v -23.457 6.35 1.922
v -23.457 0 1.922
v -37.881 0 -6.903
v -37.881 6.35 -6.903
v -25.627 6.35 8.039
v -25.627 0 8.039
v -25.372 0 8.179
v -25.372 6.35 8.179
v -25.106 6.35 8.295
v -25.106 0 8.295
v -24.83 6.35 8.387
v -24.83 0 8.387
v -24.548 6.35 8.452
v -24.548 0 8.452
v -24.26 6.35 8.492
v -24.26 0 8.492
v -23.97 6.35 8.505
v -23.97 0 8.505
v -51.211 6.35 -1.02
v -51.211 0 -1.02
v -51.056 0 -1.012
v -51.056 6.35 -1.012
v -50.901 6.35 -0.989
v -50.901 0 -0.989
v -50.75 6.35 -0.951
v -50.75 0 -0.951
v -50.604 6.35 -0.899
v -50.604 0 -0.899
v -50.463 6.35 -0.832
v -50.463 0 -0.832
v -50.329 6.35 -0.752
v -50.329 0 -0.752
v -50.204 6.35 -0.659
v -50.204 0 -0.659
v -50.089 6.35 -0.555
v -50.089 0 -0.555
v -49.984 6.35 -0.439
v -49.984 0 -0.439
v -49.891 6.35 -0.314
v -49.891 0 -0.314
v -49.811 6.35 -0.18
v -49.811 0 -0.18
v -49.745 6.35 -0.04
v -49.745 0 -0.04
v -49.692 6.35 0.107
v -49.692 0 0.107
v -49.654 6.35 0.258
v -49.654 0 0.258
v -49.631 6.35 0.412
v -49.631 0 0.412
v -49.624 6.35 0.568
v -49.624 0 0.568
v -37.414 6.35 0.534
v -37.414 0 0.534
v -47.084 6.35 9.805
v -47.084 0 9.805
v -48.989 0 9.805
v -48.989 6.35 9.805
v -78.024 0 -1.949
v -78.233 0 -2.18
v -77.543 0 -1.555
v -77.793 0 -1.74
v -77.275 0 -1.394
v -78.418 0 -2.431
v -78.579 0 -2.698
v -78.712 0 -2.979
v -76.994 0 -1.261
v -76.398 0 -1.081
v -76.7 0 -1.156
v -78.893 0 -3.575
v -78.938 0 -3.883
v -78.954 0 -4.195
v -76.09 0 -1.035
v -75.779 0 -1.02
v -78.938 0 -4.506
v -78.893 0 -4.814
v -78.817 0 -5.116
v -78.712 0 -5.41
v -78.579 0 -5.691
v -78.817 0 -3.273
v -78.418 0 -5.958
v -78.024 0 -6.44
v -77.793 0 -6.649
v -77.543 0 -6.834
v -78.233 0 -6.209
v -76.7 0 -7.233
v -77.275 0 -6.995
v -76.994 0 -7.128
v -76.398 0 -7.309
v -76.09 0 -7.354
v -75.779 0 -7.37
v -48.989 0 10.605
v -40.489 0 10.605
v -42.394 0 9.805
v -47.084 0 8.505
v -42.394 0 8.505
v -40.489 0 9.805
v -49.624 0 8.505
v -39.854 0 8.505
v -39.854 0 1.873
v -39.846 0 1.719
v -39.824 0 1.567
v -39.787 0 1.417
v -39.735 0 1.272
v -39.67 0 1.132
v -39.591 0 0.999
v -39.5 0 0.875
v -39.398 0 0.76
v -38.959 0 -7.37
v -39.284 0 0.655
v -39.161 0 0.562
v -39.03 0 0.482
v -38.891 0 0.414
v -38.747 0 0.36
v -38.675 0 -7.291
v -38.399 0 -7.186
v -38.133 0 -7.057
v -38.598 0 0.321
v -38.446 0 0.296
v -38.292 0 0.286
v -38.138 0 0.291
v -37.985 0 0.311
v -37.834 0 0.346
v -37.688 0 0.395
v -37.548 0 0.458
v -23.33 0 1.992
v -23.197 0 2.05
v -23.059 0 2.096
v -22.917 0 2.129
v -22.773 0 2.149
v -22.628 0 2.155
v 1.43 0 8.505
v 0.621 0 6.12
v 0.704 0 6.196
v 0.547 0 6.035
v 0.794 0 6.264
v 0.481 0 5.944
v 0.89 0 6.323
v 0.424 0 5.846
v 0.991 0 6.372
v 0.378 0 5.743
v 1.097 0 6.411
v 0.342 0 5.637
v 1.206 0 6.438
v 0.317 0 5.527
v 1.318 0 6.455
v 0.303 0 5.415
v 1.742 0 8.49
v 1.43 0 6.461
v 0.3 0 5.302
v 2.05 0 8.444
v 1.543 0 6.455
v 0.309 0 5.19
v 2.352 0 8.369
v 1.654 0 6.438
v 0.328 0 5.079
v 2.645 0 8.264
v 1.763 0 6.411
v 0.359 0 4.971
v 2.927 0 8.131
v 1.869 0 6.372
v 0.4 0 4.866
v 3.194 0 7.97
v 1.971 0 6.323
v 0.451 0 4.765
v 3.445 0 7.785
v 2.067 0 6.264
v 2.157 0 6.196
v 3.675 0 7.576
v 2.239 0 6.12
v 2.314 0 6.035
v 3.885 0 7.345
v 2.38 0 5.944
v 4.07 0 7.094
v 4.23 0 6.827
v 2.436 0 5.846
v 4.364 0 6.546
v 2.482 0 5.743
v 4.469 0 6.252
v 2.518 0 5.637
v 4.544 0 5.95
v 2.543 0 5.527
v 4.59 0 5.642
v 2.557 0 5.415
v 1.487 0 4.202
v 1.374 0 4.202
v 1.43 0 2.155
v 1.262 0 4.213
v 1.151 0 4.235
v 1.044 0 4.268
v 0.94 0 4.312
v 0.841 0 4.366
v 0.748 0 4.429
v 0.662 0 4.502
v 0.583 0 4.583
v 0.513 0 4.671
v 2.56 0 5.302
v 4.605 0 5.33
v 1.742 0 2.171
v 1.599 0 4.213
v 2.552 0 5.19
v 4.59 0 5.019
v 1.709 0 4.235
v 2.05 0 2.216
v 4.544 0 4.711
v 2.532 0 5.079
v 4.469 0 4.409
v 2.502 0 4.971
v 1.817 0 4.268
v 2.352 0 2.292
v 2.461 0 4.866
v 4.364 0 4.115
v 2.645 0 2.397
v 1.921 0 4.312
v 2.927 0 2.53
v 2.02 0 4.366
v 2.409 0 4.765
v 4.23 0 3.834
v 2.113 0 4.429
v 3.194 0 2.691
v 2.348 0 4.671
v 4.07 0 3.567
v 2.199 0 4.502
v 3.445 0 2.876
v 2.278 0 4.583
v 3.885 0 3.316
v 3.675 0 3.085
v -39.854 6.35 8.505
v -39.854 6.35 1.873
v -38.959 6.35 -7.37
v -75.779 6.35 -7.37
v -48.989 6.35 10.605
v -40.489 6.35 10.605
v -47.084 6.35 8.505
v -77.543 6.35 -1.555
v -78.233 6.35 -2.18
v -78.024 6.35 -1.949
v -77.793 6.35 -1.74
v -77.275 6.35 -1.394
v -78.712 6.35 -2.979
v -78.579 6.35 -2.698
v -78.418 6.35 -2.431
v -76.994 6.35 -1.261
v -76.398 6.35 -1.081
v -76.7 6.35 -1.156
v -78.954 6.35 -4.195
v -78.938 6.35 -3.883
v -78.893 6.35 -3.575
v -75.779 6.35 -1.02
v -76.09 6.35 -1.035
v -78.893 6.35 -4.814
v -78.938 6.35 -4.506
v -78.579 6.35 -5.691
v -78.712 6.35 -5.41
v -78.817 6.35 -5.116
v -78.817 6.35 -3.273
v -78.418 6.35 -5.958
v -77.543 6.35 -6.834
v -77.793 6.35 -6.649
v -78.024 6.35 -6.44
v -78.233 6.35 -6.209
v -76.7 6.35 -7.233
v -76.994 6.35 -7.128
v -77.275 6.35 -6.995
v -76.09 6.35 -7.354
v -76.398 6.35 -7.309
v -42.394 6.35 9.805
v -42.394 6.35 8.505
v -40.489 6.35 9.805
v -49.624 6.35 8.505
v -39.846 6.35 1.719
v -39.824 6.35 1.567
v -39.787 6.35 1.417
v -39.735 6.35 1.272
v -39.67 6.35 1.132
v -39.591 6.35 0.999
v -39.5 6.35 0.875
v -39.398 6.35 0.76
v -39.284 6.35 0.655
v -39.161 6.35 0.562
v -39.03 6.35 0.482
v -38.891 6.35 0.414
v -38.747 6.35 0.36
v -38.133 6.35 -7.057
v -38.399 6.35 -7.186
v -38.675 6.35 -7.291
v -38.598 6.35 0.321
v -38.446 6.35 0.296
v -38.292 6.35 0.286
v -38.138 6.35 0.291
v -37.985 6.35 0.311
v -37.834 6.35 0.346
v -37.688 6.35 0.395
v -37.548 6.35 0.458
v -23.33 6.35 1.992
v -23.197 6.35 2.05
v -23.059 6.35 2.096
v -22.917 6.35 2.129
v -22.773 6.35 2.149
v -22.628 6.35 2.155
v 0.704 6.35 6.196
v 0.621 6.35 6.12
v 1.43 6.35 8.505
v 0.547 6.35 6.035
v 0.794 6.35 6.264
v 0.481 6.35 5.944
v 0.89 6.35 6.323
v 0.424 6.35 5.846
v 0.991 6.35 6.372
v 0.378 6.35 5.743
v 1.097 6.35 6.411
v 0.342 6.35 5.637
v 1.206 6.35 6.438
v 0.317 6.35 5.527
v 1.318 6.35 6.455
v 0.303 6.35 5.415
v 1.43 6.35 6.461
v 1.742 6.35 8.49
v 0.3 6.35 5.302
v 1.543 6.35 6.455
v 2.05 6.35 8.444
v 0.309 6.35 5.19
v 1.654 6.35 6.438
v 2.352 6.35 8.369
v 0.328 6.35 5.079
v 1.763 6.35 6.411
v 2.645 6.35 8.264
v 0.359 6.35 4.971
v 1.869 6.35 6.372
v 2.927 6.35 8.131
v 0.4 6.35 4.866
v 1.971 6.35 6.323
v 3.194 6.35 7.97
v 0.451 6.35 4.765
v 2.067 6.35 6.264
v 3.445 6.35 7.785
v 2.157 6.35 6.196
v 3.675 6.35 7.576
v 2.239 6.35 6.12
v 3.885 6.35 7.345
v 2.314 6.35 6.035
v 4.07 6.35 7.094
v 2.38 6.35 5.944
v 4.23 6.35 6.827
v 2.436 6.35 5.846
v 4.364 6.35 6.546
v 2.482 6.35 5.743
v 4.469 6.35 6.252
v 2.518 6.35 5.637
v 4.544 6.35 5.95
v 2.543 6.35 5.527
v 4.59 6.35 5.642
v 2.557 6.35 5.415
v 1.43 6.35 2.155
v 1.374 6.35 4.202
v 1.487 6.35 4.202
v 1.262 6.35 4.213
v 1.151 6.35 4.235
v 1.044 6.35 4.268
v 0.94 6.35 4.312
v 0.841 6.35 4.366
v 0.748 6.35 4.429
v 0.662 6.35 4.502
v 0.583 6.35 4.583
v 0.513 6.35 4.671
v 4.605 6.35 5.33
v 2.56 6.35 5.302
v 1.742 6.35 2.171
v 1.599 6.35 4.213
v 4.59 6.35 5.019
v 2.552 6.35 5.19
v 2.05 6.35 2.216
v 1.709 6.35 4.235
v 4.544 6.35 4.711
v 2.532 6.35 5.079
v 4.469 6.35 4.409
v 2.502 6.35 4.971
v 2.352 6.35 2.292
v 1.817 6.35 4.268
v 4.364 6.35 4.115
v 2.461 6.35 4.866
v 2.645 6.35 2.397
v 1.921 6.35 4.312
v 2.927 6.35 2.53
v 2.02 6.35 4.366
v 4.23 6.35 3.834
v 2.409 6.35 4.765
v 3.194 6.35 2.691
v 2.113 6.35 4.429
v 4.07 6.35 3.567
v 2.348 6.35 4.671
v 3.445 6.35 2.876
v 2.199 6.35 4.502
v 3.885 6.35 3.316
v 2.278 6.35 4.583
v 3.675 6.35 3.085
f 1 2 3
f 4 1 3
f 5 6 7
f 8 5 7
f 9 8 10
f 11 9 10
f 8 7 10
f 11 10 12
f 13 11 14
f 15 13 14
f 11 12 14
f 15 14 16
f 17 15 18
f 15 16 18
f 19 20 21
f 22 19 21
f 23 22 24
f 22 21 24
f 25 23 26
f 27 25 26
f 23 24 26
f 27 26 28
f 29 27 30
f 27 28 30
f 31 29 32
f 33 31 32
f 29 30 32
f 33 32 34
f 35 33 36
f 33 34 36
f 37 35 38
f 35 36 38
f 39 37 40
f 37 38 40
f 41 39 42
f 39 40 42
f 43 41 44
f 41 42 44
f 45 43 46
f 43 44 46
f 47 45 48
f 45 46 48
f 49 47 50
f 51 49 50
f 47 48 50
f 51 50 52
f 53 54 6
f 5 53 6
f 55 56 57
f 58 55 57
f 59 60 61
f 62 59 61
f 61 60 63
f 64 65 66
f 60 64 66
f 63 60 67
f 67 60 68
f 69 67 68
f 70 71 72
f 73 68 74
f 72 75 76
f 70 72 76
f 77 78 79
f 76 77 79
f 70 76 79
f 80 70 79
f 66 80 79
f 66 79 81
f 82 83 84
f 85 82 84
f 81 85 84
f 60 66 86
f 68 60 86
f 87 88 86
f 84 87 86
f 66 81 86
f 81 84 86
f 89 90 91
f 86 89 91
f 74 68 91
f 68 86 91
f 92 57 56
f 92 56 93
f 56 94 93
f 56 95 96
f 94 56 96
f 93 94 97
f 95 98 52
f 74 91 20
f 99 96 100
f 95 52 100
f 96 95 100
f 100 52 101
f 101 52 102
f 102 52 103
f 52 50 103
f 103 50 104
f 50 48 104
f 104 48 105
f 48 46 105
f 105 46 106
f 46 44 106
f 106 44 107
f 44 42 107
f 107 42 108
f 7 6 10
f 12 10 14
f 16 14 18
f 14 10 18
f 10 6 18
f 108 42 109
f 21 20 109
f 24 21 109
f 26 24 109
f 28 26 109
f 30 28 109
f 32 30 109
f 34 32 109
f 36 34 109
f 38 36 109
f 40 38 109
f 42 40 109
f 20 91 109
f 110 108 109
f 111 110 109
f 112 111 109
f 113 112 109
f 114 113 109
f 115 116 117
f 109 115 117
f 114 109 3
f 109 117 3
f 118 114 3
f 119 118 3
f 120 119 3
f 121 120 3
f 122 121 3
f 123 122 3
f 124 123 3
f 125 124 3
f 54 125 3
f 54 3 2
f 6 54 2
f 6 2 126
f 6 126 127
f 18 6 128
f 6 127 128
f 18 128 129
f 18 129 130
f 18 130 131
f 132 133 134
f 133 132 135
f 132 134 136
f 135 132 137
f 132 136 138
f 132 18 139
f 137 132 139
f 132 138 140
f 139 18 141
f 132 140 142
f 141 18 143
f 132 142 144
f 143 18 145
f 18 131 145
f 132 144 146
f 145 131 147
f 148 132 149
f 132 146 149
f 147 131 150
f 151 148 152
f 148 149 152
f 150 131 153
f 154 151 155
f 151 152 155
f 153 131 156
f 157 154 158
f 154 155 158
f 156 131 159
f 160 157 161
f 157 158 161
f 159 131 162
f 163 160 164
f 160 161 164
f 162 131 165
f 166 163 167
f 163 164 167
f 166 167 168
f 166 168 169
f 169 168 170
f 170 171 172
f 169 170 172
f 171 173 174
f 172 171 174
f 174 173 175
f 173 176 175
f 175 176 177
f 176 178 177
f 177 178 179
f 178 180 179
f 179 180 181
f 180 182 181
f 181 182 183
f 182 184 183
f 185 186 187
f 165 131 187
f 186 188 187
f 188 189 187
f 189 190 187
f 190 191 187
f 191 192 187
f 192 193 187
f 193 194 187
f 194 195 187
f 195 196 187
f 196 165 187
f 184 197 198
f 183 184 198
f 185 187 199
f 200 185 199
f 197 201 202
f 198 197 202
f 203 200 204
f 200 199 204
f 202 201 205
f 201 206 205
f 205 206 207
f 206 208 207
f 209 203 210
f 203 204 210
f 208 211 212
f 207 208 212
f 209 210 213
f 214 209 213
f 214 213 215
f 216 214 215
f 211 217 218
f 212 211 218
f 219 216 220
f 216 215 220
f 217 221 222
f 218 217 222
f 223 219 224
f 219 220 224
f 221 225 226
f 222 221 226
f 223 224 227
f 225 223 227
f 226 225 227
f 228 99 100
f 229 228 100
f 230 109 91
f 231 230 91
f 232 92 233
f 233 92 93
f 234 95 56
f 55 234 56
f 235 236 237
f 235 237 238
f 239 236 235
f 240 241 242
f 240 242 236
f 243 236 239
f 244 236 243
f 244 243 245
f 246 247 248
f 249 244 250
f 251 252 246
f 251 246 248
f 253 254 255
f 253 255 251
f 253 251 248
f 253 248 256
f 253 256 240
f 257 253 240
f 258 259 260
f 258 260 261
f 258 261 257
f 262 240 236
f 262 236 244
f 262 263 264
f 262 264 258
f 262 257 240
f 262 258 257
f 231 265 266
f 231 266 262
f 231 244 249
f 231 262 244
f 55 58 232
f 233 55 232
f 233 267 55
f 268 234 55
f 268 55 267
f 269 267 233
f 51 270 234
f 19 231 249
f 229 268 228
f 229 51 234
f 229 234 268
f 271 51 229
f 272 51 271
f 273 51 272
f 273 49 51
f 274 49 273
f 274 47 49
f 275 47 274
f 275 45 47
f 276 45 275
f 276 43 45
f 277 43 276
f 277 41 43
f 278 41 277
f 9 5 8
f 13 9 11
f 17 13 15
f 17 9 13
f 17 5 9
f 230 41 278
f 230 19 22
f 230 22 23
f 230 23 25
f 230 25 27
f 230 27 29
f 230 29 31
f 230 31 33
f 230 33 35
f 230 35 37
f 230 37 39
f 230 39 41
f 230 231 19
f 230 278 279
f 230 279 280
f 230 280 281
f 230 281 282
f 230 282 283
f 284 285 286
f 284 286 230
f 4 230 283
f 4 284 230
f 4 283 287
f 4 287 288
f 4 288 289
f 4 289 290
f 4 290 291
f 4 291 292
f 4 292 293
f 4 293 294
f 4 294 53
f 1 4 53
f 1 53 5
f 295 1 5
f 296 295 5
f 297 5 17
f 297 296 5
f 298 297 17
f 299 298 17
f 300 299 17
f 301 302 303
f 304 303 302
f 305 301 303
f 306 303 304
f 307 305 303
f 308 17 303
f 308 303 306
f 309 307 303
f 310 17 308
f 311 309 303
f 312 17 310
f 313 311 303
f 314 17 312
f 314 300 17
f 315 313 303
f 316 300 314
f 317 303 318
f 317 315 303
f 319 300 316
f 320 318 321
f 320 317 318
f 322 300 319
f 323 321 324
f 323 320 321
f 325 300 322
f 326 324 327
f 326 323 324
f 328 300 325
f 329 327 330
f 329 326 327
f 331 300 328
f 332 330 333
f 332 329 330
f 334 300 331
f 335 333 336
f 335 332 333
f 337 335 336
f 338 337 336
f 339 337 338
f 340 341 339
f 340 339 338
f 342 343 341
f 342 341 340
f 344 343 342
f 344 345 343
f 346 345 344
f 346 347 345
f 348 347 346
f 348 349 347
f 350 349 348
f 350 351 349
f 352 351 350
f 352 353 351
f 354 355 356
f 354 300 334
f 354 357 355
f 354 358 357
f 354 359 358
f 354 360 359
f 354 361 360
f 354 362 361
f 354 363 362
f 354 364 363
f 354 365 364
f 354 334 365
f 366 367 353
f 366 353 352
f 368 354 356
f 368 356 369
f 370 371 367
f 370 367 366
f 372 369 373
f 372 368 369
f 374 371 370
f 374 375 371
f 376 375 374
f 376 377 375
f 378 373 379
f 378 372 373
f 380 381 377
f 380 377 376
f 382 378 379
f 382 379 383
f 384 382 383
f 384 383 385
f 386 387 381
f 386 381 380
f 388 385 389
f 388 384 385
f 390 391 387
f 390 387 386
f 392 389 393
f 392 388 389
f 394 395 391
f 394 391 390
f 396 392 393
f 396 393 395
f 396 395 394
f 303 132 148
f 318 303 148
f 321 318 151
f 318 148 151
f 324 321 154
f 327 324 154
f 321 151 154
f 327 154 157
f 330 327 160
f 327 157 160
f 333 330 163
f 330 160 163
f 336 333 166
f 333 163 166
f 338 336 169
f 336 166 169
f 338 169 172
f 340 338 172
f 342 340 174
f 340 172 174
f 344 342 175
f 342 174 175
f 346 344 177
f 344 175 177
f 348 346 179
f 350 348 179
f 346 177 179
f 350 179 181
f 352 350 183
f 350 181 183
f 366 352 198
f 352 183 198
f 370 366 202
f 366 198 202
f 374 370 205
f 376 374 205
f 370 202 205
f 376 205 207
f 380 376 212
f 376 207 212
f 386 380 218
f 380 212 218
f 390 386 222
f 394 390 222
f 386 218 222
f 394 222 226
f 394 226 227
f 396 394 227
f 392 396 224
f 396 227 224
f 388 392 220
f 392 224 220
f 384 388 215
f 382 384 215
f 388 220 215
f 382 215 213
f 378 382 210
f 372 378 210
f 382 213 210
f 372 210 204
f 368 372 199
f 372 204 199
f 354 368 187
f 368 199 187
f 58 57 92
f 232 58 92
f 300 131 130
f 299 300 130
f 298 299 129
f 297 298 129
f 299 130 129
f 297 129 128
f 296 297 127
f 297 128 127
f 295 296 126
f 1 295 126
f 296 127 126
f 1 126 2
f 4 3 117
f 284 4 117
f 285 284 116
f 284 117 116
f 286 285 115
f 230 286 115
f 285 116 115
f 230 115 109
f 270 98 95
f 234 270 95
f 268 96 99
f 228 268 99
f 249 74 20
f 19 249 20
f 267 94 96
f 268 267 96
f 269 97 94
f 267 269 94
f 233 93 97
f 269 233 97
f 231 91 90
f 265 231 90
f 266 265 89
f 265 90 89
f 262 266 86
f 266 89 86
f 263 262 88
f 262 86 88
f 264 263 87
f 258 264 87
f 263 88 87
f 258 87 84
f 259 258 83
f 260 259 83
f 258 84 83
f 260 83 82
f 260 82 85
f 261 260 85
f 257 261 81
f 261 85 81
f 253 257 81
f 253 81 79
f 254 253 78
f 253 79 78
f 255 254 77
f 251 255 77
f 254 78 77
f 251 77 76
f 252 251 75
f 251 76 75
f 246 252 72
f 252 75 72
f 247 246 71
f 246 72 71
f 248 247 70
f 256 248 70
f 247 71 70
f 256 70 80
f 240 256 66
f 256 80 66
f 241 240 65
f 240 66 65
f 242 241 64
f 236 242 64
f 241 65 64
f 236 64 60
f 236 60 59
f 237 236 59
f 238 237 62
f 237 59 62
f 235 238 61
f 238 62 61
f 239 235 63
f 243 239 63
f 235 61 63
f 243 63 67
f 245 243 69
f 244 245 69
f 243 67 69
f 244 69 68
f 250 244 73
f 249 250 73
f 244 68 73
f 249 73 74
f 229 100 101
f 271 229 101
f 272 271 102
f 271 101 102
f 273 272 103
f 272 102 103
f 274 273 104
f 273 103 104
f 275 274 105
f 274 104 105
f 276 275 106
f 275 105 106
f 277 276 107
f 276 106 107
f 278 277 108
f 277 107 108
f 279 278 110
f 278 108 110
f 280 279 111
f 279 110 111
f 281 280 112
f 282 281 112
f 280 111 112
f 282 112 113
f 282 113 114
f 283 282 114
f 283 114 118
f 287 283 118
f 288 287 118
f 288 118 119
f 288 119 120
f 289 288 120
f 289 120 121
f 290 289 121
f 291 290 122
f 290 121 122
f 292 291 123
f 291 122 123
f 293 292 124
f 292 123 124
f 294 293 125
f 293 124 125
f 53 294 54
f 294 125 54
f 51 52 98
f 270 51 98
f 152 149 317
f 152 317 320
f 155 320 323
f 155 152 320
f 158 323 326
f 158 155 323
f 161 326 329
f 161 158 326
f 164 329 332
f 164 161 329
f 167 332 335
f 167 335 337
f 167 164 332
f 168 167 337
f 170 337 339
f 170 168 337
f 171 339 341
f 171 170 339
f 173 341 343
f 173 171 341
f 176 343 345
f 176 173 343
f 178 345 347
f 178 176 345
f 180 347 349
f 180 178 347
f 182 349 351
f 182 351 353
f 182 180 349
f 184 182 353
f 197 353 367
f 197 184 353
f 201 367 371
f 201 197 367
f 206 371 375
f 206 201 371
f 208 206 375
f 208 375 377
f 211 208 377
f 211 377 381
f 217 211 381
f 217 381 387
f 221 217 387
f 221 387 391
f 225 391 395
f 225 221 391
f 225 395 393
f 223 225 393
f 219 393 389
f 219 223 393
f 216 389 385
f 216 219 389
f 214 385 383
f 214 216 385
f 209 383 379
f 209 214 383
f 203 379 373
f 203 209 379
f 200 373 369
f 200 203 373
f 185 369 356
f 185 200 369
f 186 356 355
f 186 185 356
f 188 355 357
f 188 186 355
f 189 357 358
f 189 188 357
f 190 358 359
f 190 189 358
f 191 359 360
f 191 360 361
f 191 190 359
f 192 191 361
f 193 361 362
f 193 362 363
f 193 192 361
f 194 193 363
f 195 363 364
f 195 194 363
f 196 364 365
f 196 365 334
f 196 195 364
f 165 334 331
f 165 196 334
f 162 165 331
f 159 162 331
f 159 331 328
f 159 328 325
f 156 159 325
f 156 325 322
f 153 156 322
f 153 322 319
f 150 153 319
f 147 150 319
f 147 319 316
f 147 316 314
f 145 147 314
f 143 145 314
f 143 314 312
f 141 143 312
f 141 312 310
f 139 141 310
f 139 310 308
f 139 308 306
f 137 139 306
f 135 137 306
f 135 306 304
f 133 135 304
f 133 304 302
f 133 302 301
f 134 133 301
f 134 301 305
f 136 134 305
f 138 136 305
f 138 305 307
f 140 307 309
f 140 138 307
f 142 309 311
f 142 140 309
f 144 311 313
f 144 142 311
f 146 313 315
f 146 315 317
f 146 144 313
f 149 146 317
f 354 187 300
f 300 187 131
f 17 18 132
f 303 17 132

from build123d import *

# Parameters (mm, degrees)
SKETCH1_R           = 1.1303
BOSS_EXTRUDE1_DEPTH = 6.35


with BuildPart() as part:
    # Sketch1 → Boss-Extrude1 (new body)
    with BuildSketch(Plane(origin=(0, 0, 0), x_dir=(1, 0, 0), z_dir=(0, 1, 0))):
        with BuildLine():
            Line((1.430315472, -2.155489974), (-22.62836127, -2.155489974))
            ThreePointArc((-22.62836127, -2.155489974), (-23.058725894, -2.096041852), (-23.456858243, -1.922149868))
            Line((-23.456858243, -1.922149868), (-37.881091448, 6.902829812))
            ThreePointArc((-37.881091448, 6.902829812), (-38.398503134, 7.18649116), (-38.959469005, 7.369510026))
            Line((-38.959469005, 7.369510026), (-75.77856814, 7.369510026))
            ThreePointArc((-75.77856814, 7.369510026), (-78.95356814, 4.194510026), (-75.77856814, 1.019510026))
            Line((-75.77856814, 1.019510026), (-51.211184528, 1.019510026))
            ThreePointArc((-51.211184528, 1.019510026), (-50.088652513, 0.554542041), (-49.623684528, -0.567989974))
            Line((-49.623684528, -0.567989974), (-49.623684528, -8.505489974))
            Line((-49.623684528, -8.505489974), (-47.083684528, -8.505489974))
            Line((-47.083684528, -8.505489974), (-47.083684528, -9.805489974))
            Line((-47.083684528, -9.805489974), (-48.988684528, -9.805489974))
            Line((-48.988684528, -9.805489974), (-48.988684528, -10.605489974))
            Line((-48.988684528, -10.605489974), (-40.48868451, -10.605489974))
            Line((-40.48868451, -10.605489974), (-40.48868451, -9.805489974))
            Line((-40.48868451, -9.805489974), (-42.39368451, -9.805489974))
            Line((-42.39368451, -9.805489974), (-42.39368451, -8.505489974))
            Line((-42.39368451, -8.505489974), (-39.85368451, -8.505489974))
            Line((-39.85368451, -8.505489974), (-39.85368451, -1.873214268))
            ThreePointArc((-39.85368451, -1.873214268), (-39.029938005, -0.481511409), (-37.413575094, -0.534105074))
            Line((-37.413575094, -0.534105074), (-25.626678473, -8.038809761))
            ThreePointArc((-25.626678473, -8.038809761), (-24.830413776, -8.386593729), (-23.969684528, -8.505489974))
            Line((-23.969684528, -8.505489974), (1.430315472, -8.505489974))
            ThreePointArc((1.430315472, -8.505489974), (4.605315472, -5.330489974), (1.430315472, -2.155489974))
        make_face()
        with Locations(Location((1.430315472, -5.330489974, 0), (0, 0, 270))):
            Circle(SKETCH1_R, mode=Mode.SUBTRACT)
    extrude(amount=BOSS_EXTRUDE1_DEPTH)


solid = part.part
